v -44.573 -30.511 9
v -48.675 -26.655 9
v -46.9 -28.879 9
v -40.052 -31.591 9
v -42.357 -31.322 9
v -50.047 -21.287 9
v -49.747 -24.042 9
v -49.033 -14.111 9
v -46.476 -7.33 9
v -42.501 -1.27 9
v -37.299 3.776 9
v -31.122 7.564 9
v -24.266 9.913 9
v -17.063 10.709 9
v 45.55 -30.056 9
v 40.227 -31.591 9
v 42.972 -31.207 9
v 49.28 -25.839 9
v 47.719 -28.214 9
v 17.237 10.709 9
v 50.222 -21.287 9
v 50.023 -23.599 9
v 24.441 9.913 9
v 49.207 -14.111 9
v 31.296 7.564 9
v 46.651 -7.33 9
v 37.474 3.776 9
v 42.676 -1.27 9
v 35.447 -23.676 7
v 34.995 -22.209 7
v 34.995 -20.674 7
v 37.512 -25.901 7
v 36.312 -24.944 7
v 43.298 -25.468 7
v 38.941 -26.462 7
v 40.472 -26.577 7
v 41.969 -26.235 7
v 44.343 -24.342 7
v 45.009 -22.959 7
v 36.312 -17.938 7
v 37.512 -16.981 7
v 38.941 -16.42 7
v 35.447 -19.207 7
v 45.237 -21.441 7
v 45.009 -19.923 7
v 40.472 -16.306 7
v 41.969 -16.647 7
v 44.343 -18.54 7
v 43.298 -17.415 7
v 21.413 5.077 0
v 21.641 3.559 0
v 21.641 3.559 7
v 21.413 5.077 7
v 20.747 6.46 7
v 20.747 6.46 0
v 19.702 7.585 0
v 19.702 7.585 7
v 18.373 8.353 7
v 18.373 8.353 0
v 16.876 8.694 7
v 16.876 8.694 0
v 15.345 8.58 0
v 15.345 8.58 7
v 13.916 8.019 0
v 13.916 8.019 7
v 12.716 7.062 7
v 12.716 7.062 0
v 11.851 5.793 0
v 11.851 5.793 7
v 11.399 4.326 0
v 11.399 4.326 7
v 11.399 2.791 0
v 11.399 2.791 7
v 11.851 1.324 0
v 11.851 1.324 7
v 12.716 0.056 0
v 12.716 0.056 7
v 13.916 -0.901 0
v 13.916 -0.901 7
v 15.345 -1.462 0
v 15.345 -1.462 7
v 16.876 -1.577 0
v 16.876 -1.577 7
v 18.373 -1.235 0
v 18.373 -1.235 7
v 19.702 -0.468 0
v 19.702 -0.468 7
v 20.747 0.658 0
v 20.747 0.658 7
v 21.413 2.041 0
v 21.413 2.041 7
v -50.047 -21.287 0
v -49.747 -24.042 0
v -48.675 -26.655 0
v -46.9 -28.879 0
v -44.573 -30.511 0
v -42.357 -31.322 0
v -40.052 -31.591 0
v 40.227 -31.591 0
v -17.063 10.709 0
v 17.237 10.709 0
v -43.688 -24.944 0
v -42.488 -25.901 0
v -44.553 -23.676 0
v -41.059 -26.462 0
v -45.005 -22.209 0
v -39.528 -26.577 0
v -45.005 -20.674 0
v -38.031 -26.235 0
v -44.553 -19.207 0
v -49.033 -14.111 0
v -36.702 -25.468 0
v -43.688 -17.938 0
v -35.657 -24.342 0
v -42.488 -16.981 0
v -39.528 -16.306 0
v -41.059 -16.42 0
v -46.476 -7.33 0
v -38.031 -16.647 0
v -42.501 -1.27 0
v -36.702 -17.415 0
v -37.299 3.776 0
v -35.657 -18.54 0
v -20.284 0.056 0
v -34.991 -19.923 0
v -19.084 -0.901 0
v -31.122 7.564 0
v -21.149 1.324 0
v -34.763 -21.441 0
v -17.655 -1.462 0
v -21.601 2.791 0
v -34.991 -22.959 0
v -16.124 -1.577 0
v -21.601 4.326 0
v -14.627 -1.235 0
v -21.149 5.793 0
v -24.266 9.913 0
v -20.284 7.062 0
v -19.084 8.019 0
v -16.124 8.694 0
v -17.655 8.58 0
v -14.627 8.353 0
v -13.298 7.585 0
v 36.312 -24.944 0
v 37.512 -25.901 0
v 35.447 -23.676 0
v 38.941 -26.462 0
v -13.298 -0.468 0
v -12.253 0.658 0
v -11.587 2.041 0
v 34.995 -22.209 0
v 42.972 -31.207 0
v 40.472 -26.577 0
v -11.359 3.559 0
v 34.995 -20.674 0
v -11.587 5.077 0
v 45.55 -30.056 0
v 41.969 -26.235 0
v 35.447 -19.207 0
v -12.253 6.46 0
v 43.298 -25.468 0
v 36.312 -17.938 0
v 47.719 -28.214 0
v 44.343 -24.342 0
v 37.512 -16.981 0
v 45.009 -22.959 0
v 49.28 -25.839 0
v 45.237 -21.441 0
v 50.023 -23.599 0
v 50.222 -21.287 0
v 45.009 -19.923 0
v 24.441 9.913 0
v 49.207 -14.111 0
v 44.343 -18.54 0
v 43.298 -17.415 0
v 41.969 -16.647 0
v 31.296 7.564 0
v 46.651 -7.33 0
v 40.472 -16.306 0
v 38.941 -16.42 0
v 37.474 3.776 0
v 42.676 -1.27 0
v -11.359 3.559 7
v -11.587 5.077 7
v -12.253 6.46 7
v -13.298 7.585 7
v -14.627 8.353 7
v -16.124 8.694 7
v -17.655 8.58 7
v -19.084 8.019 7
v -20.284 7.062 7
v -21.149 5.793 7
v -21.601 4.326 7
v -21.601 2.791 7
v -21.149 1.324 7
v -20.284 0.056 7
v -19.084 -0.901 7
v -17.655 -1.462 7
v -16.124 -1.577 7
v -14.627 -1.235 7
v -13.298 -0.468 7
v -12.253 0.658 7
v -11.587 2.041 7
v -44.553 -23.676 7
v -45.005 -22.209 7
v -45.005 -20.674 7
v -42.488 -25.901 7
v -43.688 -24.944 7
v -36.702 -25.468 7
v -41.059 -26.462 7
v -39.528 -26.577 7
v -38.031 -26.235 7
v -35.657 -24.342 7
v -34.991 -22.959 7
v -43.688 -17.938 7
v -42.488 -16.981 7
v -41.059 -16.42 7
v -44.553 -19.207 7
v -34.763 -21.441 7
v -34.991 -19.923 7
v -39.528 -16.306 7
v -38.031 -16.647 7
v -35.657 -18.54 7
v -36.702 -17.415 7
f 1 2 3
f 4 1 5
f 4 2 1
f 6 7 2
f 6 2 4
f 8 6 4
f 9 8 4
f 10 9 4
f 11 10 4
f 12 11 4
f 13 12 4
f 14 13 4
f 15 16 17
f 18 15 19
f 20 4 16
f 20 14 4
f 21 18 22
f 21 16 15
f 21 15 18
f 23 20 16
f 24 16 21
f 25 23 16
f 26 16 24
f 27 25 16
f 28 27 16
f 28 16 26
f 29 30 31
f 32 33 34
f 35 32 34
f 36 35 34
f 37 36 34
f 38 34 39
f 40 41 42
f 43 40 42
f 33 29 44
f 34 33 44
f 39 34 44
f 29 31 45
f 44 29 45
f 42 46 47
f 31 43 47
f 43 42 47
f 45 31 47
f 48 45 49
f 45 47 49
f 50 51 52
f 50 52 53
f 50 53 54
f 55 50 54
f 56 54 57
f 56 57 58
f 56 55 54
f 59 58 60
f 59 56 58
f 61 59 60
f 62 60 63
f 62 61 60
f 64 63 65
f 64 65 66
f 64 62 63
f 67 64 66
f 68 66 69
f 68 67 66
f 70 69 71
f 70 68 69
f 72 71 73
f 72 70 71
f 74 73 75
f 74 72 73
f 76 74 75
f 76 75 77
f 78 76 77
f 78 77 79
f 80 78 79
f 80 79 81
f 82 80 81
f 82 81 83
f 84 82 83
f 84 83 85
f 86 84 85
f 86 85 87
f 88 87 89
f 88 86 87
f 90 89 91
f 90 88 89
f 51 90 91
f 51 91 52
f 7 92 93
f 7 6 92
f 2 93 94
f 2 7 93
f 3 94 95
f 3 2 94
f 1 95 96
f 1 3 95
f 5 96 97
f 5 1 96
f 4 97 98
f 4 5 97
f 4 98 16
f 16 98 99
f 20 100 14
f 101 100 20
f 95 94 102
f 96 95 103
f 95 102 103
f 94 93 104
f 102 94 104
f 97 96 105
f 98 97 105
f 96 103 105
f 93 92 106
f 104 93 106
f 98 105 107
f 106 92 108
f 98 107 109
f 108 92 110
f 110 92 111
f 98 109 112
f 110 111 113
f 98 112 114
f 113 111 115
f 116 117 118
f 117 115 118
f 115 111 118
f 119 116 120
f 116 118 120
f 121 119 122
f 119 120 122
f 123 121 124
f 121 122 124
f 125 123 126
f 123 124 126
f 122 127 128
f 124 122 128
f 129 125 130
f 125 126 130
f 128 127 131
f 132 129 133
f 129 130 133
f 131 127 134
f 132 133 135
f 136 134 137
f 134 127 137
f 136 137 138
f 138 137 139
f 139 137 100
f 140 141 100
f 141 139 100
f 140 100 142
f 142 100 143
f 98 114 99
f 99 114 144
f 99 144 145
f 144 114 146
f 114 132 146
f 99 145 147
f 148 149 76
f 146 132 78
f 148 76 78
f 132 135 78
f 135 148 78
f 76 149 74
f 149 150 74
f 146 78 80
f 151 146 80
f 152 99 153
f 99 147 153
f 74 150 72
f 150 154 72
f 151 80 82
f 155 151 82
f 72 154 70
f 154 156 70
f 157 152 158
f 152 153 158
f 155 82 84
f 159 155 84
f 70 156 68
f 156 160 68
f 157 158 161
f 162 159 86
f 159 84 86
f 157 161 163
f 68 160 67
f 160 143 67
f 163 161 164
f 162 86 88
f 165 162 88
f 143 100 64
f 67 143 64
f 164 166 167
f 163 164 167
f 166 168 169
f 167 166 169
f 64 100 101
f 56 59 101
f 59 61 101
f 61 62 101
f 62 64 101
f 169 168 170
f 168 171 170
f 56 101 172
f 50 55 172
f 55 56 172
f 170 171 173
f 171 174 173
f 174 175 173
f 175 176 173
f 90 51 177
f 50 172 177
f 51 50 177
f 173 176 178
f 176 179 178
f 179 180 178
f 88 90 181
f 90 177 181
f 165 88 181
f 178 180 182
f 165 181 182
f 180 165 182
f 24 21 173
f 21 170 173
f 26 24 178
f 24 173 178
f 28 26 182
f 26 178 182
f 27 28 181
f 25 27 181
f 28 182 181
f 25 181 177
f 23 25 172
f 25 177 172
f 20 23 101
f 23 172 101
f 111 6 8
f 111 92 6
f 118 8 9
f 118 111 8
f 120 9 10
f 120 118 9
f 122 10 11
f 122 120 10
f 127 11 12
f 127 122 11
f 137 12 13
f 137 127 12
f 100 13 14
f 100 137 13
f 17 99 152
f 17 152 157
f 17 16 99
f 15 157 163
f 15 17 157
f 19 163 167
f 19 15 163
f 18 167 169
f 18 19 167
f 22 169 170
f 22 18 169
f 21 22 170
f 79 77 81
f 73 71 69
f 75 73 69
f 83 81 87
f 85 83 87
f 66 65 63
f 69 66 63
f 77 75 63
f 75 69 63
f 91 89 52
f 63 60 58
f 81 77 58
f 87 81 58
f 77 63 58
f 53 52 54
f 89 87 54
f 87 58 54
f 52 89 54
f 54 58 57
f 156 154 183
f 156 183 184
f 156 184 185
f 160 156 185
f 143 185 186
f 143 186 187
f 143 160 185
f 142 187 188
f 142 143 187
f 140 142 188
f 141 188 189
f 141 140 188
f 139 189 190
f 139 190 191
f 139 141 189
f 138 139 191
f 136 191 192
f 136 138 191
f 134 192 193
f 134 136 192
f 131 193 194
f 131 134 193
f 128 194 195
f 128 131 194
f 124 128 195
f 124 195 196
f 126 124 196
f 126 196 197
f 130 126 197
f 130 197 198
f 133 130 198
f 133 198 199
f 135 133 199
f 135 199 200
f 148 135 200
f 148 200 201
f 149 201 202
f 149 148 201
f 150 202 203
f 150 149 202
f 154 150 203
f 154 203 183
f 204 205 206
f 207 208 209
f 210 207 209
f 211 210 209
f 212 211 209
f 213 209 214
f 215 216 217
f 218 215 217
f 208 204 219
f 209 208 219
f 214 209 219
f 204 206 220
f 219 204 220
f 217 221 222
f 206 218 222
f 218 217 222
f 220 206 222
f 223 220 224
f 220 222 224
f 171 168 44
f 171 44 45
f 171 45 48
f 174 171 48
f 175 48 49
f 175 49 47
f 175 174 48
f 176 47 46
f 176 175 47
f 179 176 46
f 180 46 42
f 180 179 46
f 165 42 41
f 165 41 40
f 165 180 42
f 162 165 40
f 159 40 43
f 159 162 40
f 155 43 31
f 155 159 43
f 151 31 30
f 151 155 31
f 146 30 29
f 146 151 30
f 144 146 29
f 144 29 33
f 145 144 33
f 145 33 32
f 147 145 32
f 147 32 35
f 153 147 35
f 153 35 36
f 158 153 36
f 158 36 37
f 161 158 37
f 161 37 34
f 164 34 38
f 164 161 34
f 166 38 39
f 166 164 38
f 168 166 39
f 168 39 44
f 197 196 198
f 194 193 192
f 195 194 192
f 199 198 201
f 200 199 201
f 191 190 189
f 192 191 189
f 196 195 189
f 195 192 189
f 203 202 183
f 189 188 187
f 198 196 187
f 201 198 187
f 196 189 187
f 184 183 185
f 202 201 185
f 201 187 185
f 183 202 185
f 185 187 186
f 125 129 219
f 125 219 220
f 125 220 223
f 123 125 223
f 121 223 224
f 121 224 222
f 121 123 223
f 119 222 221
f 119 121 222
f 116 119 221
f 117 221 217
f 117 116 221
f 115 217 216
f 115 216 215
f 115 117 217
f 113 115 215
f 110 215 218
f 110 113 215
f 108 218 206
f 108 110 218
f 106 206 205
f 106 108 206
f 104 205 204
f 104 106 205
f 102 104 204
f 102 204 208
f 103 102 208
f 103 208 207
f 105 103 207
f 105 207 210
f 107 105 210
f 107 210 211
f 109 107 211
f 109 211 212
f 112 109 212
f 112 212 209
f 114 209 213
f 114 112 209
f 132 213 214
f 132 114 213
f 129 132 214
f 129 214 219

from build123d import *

# Parameters (mm, degrees)
ESBO_O1_W                = 100.3
ESBO_O1_H                = 42.3
ESBO_O1_R                = 5.15
RESSALTO_EXTRUS_O1_DEPTH = 7
RESSALTO_EXTRUS_O2_START = 7
ESBO_O1_6_W              = 100.3
ESBO_O1_6_H              = 42.3
ESBO_O1_6_R              = 5.15
RESSALTO_EXTRUS_O2_DEPTH = 2
FILETE1_R                = 33
FILETE2_R                = 10


with BuildPart() as part:
    # Esboço1 → Ressalto-extrusão1 (new body)
    with BuildSketch(Plane.XY):
        with Locations((0.087398189, -10.441132561)):
            Rectangle(ESBO_O1_W, ESBO_O1_H)
        with Locations((-16.508590221, 3.558867439)):
            Circle(ESBO_O1_R, mode=Mode.SUBTRACT)
        with Locations((16.491409779, 3.558867439)):
            Circle(ESBO_O1_R, mode=Mode.SUBTRACT)
        with Locations((-39.912601811, -21.441132561)):
            Circle(ESBO_O1_R, mode=Mode.SUBTRACT)
        with Locations((40.087398189, -21.441132561)):
            Circle(ESBO_O1_R, mode=Mode.SUBTRACT)
    extrude(amount=RESSALTO_EXTRUS_O1_DEPTH)

    # Esboço1<6> → Ressalto-extrusão2 (add)
    # profile 1 of 5: a face of its own
    with BuildSketch(Plane.XY.offset(RESSALTO_EXTRUS_O2_START)):
        with Locations((0.087398189, -10.441132561)):
            Rectangle(ESBO_O1_6_W, ESBO_O1_6_H)
        with Locations((16.491409779, 3.558867439)):
            Circle(ESBO_O1_6_R, mode=Mode.SUBTRACT)
        with Locations((-16.508590221, 3.558867439)):
            Circle(ESBO_O1_6_R, mode=Mode.SUBTRACT)
        with Locations((-39.912601811, -21.441132561)):
            Circle(ESBO_O1_6_R, mode=Mode.SUBTRACT)
        with Locations((40.087398189, -21.441132561)):
            Circle(ESBO_O1_6_R, mode=Mode.SUBTRACT)
    # profile 2 of 5: a face of its own
    with BuildSketch(Plane.XY.offset(RESSALTO_EXTRUS_O2_START)):
        with Locations((40.087398189, -21.441132561)):
            Circle(ESBO_O1_6_R)
    # profile 3 of 5: a face of its own
    with BuildSketch(Plane.XY.offset(RESSALTO_EXTRUS_O2_START)):
        with Locations((-39.912601811, -21.441132561)):
            Circle(ESBO_O1_6_R)
    # profile 4 of 5: a face of its own
    with BuildSketch(Plane.XY.offset(RESSALTO_EXTRUS_O2_START)):
        with Locations((16.491409779, 3.558867439)):
            Circle(ESBO_O1_6_R)
    # profile 5 of 5: a face of its own
    with BuildSketch(Plane.XY.offset(RESSALTO_EXTRUS_O2_START)):
        with Locations((-16.508590221, 3.558867439)):
            Circle(ESBO_O1_6_R)
    extrude(amount=RESSALTO_EXTRUS_O2_DEPTH)

    # Filete1
    filete1_edges = [part.edges().sort_by_distance(p)[0] for p in [
        (50.237398189, 10.708867439, 4.5),
        (-50.062601811, 10.708867439, 4.5),
    ]]
    fillet(filete1_edges, radius=FILETE1_R)

    # Filete2
    filete2_edges = [part.edges().sort_by_distance(p)[0] for p in [
        (50.237398189, -31.591132561, 4.5),
        (-50.062601811, -31.591132561, 4.5),
    ]]
    fillet(filete2_edges, radius=FILETE2_R)


solid = part.part
